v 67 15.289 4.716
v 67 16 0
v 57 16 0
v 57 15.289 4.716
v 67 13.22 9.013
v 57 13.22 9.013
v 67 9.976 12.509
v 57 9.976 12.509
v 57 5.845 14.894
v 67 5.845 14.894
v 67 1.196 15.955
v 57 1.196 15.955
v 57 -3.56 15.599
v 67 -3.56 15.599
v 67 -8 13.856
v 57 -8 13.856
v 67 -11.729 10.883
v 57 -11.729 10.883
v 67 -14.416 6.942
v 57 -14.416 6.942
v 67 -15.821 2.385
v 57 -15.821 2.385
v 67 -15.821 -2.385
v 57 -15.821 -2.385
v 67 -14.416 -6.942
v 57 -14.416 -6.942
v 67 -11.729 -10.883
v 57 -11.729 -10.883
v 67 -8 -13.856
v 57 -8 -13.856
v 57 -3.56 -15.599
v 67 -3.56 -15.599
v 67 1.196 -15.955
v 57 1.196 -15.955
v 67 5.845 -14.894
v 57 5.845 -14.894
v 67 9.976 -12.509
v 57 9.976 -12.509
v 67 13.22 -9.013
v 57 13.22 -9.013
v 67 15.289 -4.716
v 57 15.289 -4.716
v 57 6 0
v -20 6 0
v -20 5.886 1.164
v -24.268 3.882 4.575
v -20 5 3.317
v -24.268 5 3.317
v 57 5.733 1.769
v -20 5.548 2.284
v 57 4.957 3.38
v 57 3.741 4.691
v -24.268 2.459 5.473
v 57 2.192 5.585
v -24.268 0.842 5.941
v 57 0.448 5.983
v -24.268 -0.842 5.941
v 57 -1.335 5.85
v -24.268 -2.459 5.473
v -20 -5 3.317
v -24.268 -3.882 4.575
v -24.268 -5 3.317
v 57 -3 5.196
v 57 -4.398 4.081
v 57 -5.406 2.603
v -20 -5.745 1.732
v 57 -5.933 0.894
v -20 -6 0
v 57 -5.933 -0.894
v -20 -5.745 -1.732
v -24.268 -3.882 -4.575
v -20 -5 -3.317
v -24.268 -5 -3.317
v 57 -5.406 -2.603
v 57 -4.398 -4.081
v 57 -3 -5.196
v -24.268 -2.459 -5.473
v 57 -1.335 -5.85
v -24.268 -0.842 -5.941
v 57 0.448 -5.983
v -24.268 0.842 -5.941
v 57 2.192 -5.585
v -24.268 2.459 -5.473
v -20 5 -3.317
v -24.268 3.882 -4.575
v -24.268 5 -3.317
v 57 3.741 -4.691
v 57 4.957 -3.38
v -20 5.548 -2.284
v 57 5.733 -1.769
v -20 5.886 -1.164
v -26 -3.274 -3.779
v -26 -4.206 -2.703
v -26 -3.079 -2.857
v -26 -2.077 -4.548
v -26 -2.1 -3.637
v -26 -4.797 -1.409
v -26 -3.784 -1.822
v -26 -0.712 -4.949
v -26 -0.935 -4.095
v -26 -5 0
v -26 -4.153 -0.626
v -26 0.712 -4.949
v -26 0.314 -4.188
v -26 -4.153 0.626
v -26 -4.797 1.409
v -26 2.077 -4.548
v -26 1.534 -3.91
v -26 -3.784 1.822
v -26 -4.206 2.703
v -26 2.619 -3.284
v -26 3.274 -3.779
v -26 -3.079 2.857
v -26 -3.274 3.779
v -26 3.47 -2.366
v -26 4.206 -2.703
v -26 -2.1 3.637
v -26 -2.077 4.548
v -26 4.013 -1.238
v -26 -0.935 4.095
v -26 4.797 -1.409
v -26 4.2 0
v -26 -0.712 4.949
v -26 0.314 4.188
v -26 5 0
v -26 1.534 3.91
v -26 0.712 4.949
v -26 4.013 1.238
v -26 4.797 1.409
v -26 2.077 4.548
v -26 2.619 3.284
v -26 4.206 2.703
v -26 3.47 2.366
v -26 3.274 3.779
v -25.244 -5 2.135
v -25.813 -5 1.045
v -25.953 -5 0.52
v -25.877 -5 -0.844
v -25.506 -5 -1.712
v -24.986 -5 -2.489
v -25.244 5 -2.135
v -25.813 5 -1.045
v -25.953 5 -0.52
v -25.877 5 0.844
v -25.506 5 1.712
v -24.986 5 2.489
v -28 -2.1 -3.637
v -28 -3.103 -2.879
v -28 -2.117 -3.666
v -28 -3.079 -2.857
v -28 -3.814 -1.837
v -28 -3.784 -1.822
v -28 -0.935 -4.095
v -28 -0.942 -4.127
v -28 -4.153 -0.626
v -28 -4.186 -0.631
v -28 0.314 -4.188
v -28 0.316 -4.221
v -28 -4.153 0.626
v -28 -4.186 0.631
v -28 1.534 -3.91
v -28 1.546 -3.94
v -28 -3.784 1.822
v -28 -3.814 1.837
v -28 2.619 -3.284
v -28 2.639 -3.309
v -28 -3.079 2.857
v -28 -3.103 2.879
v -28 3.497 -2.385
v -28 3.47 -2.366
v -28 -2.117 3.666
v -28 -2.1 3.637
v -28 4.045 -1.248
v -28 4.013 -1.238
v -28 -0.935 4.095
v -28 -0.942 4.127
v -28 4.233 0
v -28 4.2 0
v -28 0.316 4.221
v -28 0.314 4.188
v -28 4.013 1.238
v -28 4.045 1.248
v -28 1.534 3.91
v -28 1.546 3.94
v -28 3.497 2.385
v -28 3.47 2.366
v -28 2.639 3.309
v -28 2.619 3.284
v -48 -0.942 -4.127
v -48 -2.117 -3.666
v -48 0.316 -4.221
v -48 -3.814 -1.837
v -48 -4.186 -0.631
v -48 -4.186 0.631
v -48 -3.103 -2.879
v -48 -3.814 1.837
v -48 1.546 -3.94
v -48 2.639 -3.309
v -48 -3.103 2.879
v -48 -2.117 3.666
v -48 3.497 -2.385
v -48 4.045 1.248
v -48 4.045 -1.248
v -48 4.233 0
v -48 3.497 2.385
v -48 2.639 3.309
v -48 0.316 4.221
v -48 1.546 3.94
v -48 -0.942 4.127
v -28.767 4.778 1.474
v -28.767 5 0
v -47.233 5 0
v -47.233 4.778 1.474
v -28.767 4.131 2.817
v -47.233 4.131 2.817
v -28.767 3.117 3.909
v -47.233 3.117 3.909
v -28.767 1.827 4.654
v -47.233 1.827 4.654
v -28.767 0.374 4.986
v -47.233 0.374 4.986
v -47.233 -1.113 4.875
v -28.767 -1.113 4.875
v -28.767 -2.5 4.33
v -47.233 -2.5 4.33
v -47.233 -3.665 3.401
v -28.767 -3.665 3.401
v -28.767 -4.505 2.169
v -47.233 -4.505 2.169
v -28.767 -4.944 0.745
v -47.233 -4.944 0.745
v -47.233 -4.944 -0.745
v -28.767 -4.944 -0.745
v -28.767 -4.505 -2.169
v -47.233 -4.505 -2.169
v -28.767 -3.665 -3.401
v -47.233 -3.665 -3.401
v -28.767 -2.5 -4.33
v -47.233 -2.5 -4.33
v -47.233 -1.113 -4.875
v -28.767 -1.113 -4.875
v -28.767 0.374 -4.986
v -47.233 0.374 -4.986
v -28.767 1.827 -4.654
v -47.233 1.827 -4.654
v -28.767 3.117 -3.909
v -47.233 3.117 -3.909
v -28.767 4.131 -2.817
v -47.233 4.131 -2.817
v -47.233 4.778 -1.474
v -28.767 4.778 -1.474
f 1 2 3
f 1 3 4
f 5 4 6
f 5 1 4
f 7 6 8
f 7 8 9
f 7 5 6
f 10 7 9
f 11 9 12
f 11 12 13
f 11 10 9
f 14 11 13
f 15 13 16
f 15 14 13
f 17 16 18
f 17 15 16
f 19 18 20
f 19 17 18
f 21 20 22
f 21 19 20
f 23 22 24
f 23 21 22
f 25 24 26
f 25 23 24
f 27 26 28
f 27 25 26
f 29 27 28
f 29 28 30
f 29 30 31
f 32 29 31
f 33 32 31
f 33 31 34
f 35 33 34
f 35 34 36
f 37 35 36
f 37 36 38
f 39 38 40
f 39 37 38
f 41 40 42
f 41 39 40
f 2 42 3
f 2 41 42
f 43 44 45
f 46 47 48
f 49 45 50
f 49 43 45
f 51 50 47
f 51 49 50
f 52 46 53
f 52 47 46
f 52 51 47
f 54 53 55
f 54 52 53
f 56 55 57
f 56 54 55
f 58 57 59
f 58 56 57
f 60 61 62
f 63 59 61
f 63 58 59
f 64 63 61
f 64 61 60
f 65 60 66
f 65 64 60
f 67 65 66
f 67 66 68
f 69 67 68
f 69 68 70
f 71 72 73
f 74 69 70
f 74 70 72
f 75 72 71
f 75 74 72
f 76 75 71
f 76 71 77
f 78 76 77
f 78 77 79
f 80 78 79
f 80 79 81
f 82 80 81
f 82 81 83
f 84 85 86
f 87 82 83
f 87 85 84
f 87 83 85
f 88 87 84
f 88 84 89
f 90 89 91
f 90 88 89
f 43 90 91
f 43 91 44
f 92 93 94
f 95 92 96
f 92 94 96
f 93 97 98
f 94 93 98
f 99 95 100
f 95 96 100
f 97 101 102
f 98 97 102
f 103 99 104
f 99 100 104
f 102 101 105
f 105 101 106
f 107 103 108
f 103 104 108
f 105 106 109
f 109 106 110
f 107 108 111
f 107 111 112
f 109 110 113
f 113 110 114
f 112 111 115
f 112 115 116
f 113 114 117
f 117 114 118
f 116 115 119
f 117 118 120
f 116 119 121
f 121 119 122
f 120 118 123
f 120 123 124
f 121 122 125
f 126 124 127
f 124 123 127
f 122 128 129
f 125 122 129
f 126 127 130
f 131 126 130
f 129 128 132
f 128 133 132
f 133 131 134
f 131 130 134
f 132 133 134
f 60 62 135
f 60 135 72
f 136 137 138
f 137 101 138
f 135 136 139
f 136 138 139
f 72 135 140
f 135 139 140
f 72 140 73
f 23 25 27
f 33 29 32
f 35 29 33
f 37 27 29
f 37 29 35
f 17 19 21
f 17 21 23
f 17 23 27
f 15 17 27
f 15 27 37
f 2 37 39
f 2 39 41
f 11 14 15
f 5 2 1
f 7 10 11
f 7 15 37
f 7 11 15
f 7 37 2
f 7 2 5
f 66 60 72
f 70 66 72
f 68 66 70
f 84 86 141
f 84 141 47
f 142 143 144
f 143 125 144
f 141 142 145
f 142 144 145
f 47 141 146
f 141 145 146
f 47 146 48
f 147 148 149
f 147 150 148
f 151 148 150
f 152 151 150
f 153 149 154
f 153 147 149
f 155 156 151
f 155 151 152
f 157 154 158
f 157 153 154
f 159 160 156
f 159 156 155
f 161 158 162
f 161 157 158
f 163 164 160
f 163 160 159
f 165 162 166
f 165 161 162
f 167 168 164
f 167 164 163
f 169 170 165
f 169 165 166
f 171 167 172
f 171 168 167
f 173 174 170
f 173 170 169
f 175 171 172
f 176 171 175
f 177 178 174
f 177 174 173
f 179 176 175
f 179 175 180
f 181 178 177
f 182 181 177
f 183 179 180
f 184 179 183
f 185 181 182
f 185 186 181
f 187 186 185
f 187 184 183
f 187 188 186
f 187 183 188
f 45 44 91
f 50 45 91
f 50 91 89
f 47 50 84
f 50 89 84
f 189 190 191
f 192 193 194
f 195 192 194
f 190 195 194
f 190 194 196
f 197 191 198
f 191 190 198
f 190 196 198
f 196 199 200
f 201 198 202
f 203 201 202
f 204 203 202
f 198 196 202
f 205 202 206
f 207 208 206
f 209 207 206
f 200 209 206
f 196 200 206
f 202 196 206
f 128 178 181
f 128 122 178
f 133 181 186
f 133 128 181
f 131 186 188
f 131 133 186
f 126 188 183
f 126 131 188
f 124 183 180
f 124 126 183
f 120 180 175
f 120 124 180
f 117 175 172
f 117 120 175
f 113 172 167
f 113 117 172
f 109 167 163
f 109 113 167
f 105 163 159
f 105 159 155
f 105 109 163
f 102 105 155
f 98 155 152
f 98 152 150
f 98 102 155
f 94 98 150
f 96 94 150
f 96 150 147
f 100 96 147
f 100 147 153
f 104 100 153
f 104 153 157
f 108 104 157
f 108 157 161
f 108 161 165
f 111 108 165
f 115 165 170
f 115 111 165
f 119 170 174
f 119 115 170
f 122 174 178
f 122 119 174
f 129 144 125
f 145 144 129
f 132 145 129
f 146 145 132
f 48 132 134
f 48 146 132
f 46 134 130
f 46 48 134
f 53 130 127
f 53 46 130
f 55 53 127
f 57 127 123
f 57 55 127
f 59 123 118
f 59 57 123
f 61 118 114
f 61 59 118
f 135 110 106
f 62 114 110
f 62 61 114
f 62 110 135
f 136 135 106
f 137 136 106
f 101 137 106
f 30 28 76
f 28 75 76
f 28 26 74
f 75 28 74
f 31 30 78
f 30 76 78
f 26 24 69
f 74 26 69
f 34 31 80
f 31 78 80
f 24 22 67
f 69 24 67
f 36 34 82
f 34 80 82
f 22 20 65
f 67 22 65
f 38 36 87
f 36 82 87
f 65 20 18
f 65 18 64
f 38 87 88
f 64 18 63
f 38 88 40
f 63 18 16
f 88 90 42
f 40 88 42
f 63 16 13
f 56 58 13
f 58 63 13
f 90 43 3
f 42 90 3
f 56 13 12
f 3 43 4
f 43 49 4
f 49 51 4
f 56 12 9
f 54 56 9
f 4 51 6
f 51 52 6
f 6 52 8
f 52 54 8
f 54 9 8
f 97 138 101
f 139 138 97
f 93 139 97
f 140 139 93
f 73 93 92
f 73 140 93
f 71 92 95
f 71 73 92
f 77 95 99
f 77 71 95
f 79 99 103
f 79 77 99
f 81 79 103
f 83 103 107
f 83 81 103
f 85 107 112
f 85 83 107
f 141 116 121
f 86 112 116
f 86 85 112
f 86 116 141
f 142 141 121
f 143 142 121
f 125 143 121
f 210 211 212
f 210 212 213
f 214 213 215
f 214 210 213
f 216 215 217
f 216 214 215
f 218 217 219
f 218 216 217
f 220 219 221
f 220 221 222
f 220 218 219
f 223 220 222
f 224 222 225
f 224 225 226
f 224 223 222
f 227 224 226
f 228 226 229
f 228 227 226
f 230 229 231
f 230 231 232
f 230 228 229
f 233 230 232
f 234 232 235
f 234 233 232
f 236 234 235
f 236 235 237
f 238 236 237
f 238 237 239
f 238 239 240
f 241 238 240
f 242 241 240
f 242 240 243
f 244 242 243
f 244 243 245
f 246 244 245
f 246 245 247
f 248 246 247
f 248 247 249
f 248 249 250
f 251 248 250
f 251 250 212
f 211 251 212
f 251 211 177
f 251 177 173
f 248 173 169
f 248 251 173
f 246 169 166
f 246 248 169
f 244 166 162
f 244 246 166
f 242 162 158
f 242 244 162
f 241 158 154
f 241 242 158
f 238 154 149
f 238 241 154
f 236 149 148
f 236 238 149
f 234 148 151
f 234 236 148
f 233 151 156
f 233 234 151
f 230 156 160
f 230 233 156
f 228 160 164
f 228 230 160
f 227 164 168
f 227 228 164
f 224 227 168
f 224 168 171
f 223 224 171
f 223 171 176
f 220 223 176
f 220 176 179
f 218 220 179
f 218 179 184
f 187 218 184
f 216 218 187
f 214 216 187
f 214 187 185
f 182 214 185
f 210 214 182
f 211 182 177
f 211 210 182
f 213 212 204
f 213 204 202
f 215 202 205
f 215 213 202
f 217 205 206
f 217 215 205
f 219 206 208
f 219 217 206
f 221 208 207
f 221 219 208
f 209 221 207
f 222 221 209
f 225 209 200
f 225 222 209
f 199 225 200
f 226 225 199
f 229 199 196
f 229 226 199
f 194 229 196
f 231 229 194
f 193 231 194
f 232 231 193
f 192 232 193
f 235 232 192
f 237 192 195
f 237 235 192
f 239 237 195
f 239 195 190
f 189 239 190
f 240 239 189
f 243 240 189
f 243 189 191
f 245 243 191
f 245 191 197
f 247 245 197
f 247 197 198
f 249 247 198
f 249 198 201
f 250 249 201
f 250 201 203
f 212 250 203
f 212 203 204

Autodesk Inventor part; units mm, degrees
sketch "Sketch_1" plane through (0, 0, 0) normal (0, 0, 1) x (1, 0, 0)
  line L0 (67, 0) -> (-48, 0)
  line L1 (-48, 0) -> (-48, 4.233)
  line L2 (-48, 4.233) -> (-47.233, 5)
  line L3 (-47.233, 5) -> (-28.767, 5)
  line L4 (-28.767, 5) -> (-28, 4.233)
  line L5 (-28, 4.233) -> (-28, 4.2)
  line L6 (-28, 4.2) -> (-26, 4.2)
  line L7 (-26, 4.2) -> (-26, 5)
  line L8 (-26, 5) -> (-24.2679, 6)
  line L9 (-24.2679, 6) -> (57, 6)
  line L10 (57, 6) -> (57, 16)
  line L11 (57, 16) -> (67, 16)
  line L12 (67, 16) -> (67, 0)
  line L13 (67, 0) -> (-48, 0)
revolve "Revolution1" add sketch "Sketch_1" angle 360 about axis through (67, 0, 0) along (1, 0, 0)
thread "Thread1" size "M10x1.25" class "6g" standard "ISO Metric profile" full length
sketch "Sketch_4" plane through (-26, 0, 0) normal (1, 0, 0) x (0, 0, -1)
  line L0 (-13, -10) -> (13, -10)
  line L1 (13, -10) -> (13, 10)
  line L2 (13, 10) -> (-13, 10)
  line L3 (-13, 10) -> (-13, -10)
  line L4 (-8, 5) -> (-8, -5)
  line L5 (-8, -5) -> (8, -5)
  line L6 (8, -5) -> (8, 5)
  line L7 (8, 5) -> (-8, 5)
extrude "Extrusion1" cut sketch "Sketch_4" along normal blind 6
ref_plane "A4_XY" through (170, 0, 0) normal (0, 1, 0) x (1, 0, 0)
ref_plane "A4_YZ" through (170, 0, 0) normal (1, 0, 0) x (0, 0, -1)
ref_plane "A4_ZX" through (170, 0, 0) normal (0, 0, -1) x (0, 1, 0)
ref_plane "ROD_BODY_XY" through (0, 0, 0) normal (1, 0, 0) x (0, 0, -1)
ref_plane "ROD_BODY_YZ" through (0, 0, 0) normal (0, 0, -1) x (0, 1, 0)
ref_plane "ROD_BODY_ZX" through (0, 0, 0) normal (0, 1, 0) x (1, 0, 0)
ref_plane "ROD_NUT_XY" through (-48, 0, 0) normal (-1, 0, 0) x (0, 0, -1)
ref_plane "ROD_NUT_YZ" through (-48, 0, 0) normal (0, 0, -1) x (0, -1, 0)
ref_plane "ROD_NUT_ZX" through (-48, 0, 0) normal (0, -1, 0) x (-1, 0, 0)
properties part number "CP96S32-25_ROD"
